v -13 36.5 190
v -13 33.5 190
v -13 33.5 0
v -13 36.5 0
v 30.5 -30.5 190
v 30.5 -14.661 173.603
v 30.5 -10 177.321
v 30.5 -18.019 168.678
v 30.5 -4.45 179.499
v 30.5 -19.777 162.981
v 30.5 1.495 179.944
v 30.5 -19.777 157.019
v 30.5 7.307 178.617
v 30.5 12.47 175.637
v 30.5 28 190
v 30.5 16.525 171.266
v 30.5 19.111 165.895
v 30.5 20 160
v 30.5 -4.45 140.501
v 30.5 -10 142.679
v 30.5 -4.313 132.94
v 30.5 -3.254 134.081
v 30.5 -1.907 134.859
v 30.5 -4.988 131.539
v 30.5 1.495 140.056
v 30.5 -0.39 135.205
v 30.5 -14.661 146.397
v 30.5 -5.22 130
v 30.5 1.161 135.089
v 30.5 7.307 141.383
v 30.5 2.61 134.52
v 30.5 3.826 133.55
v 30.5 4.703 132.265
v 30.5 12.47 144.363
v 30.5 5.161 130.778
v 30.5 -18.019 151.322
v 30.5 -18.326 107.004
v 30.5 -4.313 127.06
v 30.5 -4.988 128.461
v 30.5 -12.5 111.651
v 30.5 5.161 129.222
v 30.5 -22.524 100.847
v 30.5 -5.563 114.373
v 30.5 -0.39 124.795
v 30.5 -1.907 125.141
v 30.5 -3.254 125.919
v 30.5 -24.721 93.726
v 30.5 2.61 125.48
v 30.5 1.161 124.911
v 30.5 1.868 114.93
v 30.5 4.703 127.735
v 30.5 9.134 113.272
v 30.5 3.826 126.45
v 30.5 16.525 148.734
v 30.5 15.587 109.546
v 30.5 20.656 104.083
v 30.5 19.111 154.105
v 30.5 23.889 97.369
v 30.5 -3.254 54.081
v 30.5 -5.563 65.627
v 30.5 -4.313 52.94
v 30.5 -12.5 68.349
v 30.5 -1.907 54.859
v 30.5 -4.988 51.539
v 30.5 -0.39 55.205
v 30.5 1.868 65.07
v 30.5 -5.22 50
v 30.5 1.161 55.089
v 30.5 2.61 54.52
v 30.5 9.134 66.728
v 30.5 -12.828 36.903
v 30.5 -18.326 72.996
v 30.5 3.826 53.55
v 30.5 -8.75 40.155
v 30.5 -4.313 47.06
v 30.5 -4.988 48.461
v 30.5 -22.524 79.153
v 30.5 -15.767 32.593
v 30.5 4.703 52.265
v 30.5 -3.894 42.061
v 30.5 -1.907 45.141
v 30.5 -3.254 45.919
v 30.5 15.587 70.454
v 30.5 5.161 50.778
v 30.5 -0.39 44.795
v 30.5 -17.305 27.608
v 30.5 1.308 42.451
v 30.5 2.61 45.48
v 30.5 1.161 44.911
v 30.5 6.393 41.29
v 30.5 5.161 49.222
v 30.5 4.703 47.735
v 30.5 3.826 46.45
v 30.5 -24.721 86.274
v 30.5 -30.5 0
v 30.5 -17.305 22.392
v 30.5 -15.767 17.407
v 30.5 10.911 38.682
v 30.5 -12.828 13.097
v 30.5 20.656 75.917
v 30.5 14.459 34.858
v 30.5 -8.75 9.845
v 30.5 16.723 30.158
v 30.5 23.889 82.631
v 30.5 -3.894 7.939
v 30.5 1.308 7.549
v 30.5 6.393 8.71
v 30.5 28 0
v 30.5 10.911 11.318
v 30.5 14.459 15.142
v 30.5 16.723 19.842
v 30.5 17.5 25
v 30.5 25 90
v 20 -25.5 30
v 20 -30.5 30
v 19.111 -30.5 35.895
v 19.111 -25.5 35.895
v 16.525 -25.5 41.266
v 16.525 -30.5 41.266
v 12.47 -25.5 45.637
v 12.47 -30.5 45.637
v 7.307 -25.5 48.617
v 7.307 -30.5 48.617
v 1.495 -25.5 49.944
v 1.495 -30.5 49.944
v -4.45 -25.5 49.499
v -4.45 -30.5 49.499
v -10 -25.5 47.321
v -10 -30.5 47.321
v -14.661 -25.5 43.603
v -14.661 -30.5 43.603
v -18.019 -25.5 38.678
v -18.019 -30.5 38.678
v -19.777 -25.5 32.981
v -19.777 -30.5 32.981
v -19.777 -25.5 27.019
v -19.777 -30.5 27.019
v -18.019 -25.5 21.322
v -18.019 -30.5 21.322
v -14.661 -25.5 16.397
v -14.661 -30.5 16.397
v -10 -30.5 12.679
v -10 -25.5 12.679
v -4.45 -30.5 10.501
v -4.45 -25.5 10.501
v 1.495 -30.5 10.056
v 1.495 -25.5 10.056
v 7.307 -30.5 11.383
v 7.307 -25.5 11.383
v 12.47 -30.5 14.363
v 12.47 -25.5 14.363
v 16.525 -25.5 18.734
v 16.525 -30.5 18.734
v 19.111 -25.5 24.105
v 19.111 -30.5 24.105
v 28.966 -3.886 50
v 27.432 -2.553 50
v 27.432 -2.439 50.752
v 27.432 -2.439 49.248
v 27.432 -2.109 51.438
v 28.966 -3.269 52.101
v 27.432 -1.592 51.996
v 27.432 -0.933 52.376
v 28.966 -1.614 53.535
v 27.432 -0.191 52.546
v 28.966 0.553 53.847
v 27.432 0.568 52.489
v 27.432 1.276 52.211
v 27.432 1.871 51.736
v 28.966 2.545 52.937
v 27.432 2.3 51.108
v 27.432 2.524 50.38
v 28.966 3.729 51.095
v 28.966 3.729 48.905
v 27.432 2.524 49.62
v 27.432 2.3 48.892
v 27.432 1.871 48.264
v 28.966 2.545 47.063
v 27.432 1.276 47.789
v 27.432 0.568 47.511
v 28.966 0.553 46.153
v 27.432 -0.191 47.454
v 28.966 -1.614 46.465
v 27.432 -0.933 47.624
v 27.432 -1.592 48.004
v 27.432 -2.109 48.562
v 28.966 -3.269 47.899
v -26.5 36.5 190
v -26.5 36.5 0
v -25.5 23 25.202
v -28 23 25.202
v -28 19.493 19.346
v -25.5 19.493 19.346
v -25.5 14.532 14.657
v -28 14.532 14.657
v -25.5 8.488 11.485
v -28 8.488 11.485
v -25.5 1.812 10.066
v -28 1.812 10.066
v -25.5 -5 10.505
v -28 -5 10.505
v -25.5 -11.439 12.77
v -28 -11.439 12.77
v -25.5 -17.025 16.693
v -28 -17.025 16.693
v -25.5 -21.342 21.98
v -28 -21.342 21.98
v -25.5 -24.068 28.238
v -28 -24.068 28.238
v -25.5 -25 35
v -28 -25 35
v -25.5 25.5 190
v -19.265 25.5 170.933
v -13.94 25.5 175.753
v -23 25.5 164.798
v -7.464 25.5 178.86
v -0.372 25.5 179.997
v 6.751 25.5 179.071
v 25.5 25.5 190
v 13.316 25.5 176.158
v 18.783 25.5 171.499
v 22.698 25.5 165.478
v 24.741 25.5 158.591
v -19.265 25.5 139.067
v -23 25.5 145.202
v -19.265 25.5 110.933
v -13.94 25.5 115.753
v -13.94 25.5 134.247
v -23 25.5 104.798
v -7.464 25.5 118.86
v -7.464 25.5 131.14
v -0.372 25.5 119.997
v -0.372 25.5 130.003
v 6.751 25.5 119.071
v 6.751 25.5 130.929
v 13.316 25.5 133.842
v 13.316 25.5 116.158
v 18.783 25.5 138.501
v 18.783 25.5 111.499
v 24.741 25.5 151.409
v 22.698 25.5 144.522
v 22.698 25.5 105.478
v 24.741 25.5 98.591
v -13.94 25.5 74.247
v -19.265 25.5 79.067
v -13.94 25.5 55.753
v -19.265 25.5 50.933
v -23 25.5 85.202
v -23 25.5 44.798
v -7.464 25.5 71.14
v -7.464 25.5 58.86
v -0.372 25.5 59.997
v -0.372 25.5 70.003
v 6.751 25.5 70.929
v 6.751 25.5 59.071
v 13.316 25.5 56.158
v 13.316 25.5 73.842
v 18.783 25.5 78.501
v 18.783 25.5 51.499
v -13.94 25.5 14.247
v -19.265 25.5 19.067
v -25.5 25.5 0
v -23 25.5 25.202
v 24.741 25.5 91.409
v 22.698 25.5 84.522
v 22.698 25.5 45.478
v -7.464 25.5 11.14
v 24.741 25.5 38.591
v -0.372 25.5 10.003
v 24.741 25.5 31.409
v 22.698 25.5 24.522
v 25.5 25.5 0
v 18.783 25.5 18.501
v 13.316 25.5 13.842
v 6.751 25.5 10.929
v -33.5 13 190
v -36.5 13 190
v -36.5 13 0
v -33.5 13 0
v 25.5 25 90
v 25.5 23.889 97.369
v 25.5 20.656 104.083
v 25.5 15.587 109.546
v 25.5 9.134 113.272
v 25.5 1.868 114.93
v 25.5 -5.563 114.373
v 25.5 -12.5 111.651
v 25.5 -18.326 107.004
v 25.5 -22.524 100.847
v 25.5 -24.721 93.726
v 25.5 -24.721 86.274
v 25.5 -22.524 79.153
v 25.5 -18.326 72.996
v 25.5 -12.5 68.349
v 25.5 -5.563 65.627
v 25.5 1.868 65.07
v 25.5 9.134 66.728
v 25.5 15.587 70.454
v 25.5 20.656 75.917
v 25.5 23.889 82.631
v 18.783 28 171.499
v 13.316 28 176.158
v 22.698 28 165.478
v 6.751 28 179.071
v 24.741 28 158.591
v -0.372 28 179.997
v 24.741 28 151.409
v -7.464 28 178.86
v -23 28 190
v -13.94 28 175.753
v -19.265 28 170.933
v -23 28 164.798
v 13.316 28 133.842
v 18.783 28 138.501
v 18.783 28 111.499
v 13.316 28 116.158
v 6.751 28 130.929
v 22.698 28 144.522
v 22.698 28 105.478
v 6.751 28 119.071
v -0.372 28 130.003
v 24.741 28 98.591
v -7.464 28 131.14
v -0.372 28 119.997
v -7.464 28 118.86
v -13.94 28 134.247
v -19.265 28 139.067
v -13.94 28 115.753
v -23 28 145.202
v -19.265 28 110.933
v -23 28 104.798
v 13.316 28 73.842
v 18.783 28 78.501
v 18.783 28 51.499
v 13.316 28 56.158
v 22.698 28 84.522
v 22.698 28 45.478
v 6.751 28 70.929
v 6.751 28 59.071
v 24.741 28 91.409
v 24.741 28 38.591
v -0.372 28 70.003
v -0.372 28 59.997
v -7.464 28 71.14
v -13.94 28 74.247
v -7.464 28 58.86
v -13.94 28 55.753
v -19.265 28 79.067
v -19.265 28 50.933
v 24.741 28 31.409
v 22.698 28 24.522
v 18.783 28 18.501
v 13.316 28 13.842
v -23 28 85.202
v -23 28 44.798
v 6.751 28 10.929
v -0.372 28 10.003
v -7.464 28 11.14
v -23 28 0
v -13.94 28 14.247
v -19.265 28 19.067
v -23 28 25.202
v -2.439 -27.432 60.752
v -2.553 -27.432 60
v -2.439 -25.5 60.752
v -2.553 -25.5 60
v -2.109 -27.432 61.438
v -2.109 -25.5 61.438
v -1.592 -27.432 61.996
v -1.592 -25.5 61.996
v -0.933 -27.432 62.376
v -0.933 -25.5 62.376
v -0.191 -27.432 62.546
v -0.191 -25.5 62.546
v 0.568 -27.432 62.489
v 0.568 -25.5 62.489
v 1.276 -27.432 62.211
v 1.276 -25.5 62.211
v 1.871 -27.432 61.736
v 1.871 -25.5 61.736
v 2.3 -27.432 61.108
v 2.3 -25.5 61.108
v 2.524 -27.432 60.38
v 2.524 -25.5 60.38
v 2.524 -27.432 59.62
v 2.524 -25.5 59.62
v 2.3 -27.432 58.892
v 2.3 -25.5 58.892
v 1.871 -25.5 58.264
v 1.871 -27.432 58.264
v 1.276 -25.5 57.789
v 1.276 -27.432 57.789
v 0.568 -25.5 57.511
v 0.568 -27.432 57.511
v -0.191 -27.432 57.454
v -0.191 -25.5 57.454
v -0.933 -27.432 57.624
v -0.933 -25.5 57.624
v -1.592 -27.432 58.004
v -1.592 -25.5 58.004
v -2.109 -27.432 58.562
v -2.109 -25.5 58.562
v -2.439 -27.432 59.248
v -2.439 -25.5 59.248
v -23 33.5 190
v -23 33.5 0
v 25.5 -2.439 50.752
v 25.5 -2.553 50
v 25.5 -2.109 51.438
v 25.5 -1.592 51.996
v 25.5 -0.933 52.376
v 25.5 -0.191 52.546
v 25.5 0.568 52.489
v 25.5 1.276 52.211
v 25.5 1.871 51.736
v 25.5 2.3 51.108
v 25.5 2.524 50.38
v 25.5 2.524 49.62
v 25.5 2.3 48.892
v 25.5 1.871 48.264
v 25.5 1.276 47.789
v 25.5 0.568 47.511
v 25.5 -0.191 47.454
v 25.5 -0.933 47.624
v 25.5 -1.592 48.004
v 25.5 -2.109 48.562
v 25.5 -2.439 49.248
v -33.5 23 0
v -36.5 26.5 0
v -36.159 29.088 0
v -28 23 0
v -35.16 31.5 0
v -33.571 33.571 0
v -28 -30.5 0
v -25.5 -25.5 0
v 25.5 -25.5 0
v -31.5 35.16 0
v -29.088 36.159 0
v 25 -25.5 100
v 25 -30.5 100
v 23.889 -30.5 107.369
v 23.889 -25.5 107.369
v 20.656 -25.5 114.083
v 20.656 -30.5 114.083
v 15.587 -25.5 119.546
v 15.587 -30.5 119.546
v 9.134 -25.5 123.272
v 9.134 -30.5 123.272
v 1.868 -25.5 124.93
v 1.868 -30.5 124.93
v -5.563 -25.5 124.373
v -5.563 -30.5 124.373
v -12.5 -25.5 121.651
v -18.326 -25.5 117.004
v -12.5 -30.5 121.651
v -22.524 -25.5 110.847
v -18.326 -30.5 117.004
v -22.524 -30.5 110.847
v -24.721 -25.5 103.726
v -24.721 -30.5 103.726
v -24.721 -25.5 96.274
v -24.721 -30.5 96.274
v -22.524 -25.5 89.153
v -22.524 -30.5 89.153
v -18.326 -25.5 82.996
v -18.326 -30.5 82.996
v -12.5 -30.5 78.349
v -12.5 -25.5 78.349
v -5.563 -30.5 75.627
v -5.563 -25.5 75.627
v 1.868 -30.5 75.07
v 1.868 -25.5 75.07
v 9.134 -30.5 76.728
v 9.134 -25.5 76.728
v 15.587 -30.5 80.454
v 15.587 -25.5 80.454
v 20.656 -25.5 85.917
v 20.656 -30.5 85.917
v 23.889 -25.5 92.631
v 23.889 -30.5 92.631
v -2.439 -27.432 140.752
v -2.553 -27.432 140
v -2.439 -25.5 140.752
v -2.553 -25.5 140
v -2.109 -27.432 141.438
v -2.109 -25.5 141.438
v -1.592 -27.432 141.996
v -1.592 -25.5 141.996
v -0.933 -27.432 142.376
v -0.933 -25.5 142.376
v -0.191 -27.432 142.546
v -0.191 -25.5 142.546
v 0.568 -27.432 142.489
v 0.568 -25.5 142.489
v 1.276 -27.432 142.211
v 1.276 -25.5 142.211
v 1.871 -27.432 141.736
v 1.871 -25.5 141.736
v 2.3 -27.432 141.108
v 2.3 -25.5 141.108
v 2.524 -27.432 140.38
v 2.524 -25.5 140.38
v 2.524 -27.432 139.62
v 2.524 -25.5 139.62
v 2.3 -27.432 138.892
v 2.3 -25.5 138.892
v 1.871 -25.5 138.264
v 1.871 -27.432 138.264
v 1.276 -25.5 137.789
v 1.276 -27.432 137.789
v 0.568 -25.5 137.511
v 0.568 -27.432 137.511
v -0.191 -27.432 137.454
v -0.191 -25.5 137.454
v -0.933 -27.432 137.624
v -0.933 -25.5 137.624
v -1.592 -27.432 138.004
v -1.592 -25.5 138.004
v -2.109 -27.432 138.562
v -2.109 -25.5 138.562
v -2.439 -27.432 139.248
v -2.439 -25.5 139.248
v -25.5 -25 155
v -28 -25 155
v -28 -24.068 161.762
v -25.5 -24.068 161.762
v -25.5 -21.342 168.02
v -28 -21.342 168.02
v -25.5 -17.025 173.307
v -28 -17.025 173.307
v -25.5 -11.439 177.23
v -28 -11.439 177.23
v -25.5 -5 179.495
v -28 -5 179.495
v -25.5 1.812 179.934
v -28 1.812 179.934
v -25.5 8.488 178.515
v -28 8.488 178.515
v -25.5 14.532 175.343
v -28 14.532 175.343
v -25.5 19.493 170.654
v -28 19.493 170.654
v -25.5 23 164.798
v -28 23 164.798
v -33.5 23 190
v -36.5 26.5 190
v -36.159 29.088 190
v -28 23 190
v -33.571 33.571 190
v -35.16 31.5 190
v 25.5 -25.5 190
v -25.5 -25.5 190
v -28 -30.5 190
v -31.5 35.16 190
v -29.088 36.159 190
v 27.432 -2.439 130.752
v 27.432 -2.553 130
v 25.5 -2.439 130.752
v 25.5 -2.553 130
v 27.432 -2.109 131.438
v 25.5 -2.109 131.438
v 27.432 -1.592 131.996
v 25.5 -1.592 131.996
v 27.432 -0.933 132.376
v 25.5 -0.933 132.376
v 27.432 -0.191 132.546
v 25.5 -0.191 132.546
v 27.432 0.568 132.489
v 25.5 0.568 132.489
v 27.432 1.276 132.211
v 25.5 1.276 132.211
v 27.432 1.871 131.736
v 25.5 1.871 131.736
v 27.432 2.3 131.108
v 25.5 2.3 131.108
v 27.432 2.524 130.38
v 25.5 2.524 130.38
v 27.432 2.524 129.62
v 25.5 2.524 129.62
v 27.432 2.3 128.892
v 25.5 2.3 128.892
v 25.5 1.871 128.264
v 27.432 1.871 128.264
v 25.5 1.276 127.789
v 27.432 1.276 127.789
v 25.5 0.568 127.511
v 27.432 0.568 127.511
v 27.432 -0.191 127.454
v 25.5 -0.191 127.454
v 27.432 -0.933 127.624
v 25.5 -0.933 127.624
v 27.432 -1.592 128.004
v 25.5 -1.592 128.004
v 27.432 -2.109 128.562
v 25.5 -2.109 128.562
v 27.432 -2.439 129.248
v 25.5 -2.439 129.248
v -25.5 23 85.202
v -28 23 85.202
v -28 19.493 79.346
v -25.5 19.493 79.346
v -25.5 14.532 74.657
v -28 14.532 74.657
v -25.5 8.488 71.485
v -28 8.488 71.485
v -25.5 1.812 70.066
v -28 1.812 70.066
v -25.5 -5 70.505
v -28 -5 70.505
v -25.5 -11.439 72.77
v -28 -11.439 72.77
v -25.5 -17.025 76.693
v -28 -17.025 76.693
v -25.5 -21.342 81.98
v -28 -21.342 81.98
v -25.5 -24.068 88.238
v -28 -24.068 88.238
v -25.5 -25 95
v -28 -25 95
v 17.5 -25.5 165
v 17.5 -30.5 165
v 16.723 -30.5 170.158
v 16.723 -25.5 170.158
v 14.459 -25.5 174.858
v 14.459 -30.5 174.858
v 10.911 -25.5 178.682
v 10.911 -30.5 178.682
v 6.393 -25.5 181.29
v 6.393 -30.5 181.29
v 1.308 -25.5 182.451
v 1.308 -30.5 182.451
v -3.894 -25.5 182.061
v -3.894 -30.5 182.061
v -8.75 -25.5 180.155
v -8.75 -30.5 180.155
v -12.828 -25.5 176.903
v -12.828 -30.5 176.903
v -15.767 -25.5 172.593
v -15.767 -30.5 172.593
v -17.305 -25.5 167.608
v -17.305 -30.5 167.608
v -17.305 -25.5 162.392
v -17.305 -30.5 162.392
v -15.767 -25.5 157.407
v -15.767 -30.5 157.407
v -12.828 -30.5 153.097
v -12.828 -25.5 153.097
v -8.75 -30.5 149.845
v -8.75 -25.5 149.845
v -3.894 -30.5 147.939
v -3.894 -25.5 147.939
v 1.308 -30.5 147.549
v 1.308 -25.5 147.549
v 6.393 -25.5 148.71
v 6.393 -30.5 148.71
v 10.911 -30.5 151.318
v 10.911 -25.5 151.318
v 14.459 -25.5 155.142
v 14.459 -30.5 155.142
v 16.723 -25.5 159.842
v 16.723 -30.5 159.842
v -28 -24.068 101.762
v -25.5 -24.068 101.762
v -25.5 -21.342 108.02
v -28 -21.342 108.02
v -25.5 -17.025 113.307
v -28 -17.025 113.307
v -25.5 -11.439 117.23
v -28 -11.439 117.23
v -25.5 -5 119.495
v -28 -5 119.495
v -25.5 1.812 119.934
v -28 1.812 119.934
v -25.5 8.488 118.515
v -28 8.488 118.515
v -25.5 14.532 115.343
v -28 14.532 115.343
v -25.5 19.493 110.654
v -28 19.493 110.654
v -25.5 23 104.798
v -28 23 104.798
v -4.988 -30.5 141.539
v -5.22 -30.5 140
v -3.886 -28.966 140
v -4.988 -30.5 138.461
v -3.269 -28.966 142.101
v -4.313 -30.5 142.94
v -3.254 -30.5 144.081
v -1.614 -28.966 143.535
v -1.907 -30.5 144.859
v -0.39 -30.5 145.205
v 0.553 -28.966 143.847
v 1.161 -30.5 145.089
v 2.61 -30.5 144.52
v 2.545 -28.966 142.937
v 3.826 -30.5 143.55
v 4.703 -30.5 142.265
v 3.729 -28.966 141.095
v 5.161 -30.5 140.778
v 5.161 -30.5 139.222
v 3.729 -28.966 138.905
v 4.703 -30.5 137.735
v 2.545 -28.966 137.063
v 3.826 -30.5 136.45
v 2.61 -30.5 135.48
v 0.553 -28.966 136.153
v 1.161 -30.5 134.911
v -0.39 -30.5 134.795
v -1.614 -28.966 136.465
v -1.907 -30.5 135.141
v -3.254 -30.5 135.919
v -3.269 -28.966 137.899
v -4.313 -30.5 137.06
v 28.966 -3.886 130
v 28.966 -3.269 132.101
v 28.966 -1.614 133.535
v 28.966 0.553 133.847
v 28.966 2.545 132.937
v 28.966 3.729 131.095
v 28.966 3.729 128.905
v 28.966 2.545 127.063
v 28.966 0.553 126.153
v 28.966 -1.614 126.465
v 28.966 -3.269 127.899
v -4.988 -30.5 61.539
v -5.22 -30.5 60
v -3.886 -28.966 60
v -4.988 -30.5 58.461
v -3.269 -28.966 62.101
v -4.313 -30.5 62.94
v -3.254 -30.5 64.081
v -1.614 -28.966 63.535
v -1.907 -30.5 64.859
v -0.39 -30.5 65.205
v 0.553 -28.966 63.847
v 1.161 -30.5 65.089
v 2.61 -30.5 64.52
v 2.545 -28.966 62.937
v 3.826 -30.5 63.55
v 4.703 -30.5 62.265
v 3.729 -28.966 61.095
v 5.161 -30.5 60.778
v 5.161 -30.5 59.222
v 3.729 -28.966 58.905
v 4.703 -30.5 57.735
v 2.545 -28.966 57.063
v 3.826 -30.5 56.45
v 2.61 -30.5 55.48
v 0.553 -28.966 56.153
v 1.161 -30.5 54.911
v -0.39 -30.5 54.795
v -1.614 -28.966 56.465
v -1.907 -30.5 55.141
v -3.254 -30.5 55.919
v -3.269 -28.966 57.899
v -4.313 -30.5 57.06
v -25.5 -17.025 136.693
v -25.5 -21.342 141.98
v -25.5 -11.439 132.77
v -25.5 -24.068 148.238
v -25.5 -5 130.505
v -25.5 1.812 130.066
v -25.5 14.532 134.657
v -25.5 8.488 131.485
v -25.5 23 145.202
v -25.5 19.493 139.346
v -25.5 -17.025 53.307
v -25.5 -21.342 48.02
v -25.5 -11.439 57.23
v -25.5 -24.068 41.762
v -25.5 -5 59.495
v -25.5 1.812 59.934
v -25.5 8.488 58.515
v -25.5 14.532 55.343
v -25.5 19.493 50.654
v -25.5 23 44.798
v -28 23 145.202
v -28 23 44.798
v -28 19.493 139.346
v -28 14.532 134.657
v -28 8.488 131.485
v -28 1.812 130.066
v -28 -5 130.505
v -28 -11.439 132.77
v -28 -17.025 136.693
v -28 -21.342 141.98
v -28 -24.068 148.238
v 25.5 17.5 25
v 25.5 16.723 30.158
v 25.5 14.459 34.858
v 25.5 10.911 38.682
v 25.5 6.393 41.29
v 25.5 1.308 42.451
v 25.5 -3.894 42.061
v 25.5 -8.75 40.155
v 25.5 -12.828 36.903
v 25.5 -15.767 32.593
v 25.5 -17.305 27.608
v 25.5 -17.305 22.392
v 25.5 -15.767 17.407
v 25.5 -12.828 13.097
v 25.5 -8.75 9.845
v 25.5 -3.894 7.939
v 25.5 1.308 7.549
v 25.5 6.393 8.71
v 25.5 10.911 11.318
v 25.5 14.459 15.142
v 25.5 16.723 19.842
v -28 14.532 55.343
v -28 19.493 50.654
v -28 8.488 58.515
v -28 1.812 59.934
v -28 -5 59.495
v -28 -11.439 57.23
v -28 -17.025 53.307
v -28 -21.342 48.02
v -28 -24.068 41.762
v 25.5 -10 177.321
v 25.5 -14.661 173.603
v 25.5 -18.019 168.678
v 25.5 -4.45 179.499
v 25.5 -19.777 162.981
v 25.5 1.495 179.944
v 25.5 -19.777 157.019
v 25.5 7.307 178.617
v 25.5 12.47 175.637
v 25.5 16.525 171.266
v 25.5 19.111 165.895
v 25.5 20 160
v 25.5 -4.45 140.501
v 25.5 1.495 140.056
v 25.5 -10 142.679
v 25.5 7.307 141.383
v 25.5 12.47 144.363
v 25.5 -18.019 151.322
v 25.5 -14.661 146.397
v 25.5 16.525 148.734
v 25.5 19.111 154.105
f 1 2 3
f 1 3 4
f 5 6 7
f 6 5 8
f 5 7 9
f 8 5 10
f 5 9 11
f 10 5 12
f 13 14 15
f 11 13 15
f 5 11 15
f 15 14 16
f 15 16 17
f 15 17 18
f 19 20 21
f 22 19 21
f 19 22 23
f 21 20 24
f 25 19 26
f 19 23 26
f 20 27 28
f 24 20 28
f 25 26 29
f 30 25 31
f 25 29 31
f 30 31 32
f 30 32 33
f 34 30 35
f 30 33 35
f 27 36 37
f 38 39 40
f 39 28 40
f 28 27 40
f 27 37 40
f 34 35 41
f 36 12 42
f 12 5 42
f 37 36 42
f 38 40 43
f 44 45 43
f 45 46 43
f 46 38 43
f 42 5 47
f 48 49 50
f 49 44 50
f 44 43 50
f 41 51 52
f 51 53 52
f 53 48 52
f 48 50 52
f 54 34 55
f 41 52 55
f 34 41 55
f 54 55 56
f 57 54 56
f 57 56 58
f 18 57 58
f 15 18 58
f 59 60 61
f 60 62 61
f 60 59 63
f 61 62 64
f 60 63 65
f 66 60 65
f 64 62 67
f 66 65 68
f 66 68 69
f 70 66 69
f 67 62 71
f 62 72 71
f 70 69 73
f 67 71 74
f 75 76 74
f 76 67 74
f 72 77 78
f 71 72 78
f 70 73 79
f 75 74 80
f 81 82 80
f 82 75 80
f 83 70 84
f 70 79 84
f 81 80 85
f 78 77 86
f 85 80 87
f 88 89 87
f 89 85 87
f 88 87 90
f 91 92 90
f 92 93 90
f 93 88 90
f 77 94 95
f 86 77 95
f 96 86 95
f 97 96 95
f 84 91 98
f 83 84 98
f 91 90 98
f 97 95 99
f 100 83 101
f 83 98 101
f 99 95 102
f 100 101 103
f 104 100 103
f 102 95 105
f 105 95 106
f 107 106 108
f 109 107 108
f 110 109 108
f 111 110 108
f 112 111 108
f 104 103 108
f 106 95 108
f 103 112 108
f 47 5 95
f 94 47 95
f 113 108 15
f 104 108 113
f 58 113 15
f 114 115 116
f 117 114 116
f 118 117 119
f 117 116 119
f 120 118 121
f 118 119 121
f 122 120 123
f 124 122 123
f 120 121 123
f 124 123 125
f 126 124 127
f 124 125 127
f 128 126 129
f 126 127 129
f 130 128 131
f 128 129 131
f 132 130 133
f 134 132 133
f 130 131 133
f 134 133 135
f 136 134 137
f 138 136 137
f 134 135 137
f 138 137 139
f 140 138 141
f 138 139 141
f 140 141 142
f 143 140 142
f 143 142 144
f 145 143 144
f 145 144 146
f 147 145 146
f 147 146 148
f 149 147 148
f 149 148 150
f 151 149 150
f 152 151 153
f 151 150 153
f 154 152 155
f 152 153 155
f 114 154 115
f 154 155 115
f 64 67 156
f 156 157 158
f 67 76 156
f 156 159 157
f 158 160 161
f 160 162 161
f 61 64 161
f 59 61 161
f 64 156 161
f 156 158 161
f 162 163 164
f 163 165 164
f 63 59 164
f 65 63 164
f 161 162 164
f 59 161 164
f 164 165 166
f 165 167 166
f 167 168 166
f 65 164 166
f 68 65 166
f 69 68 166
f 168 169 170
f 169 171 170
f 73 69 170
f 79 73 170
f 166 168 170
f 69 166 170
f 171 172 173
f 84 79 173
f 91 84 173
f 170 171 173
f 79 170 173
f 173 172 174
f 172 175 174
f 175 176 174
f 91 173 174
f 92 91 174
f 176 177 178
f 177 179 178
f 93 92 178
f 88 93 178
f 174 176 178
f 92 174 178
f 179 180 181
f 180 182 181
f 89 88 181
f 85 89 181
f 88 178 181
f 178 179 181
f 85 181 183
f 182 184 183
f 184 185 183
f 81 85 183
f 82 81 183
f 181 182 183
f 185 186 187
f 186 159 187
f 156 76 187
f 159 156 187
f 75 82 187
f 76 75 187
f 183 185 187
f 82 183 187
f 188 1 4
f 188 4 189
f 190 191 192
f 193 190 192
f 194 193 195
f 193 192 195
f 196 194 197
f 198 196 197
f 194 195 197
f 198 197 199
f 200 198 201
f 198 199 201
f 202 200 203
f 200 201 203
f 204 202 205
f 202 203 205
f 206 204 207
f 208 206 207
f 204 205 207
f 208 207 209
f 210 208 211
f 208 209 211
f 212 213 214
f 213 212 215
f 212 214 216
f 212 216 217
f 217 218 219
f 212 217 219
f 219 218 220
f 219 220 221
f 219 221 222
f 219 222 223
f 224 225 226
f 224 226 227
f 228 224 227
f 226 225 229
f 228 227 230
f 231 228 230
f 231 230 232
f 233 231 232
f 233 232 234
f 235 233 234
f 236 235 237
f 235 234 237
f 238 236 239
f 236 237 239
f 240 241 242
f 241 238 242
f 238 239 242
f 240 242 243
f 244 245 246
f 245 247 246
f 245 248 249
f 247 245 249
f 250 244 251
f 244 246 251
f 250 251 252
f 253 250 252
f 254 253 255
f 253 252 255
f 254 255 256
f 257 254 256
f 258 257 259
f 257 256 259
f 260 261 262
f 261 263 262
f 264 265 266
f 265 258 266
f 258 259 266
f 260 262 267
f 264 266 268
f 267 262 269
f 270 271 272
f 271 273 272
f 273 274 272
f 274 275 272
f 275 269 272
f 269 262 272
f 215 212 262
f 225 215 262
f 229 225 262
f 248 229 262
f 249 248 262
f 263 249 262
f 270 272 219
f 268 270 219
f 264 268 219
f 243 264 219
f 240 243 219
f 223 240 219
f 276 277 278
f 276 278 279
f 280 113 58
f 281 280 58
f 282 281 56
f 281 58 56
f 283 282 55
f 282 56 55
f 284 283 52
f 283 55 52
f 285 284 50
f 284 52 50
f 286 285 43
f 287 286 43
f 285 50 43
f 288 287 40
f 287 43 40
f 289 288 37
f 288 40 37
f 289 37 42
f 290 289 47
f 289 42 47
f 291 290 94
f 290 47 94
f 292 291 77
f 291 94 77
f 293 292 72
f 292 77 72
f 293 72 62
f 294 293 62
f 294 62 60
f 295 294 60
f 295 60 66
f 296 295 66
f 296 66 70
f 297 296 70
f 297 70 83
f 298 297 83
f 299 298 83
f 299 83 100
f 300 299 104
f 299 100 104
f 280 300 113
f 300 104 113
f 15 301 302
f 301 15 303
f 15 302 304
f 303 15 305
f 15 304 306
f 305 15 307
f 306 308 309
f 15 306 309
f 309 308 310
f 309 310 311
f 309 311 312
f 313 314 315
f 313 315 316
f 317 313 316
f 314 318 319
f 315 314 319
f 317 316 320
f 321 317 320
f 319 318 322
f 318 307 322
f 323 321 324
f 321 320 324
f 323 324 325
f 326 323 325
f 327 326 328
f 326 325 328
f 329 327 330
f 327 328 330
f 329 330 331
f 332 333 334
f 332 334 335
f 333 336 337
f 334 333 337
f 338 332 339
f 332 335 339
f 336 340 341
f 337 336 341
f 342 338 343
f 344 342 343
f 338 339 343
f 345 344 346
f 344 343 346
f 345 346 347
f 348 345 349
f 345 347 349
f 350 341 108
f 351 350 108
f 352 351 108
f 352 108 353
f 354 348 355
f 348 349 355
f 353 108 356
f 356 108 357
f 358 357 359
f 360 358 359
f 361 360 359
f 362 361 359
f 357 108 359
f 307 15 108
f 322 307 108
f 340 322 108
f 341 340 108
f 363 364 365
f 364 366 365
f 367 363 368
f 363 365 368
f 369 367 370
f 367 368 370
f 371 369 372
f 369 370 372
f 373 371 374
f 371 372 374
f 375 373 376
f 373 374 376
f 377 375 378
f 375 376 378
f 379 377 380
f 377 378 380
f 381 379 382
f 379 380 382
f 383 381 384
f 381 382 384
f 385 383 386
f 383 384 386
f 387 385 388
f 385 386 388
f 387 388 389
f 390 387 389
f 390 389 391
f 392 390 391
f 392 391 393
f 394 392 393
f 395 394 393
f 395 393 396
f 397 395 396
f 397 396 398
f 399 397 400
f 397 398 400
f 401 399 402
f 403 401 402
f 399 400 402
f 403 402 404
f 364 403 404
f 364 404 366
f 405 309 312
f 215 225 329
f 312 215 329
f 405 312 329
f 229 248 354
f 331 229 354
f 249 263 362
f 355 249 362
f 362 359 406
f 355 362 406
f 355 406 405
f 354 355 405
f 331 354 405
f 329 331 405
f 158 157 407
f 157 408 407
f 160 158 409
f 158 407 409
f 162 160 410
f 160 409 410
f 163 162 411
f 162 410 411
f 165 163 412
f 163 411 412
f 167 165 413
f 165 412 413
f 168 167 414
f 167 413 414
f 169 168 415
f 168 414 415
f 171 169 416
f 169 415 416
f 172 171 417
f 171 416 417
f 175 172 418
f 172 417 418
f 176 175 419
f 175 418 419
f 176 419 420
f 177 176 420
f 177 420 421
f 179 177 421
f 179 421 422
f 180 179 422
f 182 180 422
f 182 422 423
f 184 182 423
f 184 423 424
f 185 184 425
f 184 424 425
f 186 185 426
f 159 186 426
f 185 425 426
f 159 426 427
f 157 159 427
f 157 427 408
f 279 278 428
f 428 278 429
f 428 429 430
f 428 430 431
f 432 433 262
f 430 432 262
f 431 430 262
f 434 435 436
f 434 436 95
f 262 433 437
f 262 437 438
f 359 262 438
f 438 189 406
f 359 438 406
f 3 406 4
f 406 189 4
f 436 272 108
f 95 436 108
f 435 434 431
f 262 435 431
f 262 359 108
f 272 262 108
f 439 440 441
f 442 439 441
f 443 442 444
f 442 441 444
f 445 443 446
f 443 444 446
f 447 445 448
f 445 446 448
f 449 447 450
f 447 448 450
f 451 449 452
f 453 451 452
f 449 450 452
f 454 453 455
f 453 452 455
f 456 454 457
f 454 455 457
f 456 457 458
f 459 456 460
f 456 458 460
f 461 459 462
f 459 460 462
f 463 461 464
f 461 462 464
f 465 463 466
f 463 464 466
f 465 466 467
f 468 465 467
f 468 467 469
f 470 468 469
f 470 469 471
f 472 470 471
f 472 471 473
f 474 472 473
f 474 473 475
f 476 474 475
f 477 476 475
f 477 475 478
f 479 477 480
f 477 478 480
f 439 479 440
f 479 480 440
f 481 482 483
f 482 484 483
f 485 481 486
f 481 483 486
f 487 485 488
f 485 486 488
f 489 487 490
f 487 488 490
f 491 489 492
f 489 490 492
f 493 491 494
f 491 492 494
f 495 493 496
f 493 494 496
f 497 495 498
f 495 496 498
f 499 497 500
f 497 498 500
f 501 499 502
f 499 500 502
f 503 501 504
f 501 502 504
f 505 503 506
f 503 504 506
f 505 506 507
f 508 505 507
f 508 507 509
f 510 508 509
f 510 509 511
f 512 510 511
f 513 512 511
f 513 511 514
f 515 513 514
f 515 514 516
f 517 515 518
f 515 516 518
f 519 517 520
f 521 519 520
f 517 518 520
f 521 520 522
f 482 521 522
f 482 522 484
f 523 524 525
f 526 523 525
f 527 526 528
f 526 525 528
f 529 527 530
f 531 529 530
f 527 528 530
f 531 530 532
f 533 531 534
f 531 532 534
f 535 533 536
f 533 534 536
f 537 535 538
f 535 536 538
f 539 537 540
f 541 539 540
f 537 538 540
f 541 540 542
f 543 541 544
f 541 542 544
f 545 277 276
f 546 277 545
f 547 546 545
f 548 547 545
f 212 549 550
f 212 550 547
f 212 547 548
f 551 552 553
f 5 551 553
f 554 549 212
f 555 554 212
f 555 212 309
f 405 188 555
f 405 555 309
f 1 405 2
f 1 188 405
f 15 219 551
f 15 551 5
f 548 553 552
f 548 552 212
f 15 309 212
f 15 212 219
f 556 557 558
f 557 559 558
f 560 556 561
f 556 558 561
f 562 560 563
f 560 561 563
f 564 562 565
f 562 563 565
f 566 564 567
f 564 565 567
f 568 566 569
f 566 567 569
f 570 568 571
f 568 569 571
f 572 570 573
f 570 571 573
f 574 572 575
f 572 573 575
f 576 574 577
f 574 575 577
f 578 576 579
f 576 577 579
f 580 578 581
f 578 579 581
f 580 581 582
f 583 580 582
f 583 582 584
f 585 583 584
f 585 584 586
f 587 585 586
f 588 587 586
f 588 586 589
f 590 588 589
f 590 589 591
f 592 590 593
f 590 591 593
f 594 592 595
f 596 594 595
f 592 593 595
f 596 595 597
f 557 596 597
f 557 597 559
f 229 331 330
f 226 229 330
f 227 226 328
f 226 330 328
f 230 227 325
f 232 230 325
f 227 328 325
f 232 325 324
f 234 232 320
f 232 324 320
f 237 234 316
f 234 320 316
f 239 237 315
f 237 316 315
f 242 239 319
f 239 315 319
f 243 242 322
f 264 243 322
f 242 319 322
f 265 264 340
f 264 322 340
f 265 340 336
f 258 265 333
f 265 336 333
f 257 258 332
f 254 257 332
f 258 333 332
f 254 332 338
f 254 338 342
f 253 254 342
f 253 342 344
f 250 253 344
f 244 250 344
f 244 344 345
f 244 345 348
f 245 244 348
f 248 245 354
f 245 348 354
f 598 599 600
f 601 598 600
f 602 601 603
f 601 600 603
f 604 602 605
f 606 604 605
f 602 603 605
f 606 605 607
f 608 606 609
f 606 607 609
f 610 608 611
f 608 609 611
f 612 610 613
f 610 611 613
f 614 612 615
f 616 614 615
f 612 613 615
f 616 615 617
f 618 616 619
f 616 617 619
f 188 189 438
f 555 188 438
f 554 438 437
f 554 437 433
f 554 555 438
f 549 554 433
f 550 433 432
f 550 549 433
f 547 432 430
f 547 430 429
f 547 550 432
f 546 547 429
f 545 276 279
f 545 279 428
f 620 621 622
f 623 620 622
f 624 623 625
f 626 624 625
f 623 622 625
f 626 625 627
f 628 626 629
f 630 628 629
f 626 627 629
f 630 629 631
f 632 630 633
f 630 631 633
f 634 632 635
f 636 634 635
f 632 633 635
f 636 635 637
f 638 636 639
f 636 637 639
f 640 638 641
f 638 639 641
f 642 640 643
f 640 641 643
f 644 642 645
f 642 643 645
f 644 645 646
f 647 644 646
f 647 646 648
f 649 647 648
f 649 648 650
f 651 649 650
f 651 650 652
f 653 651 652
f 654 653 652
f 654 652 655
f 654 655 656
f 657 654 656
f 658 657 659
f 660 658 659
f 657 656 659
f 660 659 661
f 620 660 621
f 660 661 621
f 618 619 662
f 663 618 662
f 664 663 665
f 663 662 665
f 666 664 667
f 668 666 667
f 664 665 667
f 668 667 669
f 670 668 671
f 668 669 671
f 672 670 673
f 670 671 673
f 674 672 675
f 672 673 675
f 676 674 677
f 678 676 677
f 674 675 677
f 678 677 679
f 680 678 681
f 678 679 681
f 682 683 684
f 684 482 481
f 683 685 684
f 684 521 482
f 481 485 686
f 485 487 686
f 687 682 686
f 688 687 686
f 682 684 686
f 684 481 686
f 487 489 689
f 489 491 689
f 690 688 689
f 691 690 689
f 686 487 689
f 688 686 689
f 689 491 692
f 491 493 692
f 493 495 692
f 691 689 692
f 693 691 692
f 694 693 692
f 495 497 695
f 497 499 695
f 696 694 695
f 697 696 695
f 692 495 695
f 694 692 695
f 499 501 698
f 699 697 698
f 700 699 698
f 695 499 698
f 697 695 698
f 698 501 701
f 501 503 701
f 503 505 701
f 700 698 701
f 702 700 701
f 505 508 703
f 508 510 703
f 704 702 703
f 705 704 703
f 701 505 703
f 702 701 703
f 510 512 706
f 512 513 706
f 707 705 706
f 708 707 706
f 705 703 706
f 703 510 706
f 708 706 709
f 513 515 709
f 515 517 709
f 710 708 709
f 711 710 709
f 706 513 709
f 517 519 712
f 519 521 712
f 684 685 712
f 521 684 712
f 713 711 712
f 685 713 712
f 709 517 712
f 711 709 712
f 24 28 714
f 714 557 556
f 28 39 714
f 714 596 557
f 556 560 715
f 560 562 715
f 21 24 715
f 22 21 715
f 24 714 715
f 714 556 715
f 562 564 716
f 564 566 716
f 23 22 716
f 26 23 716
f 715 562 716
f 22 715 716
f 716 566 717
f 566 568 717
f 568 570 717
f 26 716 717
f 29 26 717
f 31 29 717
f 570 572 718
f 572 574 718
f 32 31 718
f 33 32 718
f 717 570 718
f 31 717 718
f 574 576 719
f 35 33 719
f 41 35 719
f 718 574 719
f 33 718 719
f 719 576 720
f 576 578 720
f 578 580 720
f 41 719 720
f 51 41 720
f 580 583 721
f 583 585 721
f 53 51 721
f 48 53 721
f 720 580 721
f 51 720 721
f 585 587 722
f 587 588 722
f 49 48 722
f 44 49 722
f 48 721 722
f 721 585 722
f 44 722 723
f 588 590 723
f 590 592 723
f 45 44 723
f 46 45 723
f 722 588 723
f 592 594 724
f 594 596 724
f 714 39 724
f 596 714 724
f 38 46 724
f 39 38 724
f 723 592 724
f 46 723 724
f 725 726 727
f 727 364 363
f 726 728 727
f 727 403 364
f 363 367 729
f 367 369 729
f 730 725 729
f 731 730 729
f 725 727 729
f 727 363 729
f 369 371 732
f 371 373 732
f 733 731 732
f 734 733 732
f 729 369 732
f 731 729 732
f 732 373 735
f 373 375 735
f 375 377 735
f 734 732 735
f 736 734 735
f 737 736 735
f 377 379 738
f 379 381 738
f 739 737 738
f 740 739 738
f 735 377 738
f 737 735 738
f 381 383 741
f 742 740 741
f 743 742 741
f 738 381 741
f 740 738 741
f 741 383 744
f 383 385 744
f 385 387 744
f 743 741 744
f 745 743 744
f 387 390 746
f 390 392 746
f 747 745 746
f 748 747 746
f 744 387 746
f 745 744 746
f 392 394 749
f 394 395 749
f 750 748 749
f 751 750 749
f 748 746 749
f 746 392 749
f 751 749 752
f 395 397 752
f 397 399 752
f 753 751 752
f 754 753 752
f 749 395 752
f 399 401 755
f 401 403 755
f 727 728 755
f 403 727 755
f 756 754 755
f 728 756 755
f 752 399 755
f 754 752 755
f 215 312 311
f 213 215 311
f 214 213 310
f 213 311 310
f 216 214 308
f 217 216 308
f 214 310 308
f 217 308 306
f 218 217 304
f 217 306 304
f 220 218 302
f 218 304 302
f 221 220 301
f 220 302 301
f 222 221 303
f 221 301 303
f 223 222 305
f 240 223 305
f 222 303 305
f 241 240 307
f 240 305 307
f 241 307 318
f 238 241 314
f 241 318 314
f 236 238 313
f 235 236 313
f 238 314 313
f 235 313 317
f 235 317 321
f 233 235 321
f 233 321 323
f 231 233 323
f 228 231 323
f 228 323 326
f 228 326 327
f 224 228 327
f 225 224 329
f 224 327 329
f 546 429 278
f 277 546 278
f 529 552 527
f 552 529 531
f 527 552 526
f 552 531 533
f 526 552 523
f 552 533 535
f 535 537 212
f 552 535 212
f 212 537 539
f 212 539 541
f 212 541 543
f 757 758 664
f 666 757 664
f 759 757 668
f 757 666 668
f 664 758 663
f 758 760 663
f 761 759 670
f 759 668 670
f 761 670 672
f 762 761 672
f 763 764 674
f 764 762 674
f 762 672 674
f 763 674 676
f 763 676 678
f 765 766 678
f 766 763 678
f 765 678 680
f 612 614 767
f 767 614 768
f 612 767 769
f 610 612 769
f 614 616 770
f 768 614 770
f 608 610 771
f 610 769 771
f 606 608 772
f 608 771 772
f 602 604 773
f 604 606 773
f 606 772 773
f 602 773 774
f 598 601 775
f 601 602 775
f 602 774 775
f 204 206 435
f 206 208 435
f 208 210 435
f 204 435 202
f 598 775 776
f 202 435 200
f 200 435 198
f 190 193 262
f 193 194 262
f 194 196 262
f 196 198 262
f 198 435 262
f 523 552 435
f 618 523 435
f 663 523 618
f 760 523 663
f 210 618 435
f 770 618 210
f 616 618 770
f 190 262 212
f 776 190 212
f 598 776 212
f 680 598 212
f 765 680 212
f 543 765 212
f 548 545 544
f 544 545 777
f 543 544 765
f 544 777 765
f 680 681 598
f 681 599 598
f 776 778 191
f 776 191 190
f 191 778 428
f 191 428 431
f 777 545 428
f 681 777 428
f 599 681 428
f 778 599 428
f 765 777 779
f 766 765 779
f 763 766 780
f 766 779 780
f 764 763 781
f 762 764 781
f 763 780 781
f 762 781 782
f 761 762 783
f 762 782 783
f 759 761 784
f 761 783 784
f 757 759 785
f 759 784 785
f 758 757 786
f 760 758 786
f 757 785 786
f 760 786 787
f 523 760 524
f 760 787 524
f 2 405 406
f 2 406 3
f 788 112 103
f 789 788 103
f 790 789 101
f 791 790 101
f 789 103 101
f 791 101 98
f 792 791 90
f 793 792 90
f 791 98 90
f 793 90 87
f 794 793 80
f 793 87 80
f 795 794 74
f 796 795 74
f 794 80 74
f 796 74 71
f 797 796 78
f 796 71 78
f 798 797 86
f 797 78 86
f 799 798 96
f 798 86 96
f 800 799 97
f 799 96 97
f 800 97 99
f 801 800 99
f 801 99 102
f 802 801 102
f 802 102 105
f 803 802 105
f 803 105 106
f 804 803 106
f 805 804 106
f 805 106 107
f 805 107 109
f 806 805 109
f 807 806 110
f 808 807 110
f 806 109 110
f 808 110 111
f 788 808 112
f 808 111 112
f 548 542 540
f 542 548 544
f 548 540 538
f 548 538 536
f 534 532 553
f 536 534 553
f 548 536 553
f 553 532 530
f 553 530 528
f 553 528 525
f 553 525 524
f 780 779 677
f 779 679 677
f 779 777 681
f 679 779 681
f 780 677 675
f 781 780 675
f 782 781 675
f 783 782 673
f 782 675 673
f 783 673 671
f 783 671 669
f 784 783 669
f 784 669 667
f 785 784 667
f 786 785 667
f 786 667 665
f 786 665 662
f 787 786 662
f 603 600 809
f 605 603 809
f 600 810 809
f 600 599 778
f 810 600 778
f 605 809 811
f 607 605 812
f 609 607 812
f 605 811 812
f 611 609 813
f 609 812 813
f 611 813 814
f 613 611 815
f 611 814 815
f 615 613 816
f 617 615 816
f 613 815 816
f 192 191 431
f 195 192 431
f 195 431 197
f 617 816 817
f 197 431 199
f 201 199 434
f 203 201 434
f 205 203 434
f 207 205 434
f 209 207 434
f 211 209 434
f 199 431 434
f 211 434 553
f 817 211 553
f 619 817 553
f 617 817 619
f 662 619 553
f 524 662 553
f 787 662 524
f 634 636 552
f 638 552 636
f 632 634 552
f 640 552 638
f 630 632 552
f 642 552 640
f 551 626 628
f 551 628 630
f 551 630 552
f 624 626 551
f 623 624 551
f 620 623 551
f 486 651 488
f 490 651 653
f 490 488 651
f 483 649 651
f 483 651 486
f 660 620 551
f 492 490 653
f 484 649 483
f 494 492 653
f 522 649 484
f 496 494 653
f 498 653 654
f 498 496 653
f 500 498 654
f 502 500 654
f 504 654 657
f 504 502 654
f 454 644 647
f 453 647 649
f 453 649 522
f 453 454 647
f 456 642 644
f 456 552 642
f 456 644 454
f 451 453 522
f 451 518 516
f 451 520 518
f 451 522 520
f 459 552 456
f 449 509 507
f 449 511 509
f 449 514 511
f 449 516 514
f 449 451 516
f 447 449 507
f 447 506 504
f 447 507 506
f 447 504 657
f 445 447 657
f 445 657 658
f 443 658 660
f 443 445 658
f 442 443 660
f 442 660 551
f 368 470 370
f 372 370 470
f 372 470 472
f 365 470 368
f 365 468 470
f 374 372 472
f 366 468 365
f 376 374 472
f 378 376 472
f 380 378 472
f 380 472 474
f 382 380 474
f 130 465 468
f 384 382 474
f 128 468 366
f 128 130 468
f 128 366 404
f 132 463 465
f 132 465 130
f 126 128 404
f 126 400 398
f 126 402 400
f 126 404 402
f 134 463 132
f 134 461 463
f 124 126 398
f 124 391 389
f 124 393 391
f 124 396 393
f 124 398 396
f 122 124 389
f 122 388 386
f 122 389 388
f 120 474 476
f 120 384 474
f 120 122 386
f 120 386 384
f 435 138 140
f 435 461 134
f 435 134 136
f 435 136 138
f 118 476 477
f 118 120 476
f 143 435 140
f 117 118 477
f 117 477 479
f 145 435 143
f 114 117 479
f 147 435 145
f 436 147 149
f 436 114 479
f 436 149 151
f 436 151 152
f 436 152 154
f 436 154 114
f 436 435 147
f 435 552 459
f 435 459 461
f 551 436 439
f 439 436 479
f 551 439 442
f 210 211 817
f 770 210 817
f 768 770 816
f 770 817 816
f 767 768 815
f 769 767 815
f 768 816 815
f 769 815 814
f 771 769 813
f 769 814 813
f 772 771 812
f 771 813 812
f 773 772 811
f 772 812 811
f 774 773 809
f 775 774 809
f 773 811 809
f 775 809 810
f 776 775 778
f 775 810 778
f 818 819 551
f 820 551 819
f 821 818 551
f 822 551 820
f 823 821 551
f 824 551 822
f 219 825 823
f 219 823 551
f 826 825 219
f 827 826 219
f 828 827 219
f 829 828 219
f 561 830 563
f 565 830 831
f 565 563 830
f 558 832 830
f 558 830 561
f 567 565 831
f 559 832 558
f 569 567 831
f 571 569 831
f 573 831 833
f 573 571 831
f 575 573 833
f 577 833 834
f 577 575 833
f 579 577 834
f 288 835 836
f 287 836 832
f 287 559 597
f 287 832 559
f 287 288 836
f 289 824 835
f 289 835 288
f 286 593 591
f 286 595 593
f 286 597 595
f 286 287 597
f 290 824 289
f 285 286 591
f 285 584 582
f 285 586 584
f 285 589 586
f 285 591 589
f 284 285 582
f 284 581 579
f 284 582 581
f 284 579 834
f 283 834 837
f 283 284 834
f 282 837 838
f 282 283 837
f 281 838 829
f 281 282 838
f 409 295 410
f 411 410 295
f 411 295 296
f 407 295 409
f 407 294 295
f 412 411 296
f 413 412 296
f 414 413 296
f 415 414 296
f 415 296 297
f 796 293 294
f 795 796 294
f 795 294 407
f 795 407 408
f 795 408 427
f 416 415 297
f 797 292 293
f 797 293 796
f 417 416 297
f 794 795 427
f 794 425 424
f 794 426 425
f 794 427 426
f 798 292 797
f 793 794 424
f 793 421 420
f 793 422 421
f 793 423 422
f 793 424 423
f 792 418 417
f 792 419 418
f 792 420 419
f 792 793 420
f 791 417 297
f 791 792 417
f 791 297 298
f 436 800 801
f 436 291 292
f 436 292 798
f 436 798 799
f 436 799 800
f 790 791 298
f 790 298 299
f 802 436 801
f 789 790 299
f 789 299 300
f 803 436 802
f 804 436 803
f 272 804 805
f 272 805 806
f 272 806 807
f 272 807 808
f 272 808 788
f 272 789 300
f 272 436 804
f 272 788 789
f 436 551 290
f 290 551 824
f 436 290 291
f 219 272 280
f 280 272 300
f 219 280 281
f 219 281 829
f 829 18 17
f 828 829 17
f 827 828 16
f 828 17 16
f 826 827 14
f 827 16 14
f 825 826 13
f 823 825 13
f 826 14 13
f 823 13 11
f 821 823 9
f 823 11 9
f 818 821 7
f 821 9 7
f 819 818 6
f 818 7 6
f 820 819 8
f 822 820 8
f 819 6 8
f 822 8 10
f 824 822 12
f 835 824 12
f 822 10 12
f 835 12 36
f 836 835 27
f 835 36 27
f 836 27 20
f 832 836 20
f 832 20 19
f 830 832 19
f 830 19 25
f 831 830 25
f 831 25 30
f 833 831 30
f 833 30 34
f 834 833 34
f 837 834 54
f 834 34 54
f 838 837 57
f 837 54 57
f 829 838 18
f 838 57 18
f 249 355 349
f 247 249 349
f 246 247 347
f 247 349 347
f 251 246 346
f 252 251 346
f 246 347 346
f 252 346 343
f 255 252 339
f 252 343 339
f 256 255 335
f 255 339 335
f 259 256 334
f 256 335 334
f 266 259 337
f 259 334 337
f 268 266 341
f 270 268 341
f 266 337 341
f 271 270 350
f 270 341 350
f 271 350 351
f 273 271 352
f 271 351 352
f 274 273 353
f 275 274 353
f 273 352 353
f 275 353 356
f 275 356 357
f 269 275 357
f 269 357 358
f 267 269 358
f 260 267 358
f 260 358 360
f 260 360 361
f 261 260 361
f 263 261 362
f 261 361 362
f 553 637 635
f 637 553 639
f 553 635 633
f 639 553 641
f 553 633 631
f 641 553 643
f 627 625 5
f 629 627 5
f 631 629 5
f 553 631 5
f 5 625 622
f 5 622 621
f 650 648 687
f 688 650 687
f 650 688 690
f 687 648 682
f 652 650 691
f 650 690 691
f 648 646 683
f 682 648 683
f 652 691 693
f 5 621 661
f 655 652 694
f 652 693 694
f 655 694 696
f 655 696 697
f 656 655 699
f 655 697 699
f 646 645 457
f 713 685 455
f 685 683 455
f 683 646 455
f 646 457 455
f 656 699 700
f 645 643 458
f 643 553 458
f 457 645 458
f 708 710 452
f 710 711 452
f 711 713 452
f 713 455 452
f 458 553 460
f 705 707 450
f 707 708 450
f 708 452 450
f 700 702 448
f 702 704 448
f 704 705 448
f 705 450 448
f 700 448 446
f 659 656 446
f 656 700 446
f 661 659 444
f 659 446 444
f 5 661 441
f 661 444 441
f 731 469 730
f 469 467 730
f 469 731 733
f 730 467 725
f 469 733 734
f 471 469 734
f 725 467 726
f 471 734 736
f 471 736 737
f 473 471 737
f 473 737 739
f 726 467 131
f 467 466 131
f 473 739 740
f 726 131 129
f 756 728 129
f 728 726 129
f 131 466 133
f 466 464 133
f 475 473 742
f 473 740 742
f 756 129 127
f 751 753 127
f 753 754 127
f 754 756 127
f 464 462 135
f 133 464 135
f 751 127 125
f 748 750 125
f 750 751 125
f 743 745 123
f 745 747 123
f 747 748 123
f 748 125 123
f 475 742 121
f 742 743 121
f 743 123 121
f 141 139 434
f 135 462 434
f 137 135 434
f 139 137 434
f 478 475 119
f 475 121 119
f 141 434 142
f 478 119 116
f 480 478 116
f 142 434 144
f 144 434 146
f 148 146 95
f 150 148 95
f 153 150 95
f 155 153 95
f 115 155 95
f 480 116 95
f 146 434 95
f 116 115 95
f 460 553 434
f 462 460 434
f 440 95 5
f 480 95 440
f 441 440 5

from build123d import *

# Parameters (mm, degrees)
F0_W           = 5
F0_H           = 5.5
F0_W_2         = 5.5
F0_H_2         = 5
F0_W_3         = 51
F0_H_3         = 51
F1_DEPTH       = 190
F2_R           = 10
F3_R           = 25
F3_R_2         = 17.5
F3_R_3         = 20
F4_DEPTH       = 5
F5_D           = 5.1054
F5_DEPTH       = 12
F5_CSINK_D     = 10.4394
F5_CSINK_ANGLE = 82
F5_TIP         = 1.5338169022
F7_D           = 5.1054
F7_DEPTH       = 12
F7_CSINK_D     = 10.4394
F7_CSINK_ANGLE = 82
F7_TIP         = 1.5338169022
F6_R           = 20
F6_R_2         = 25
F6_R_3         = 17.5
F8_DEPTH       = 5
F10_DEPTH      = 2.5
F12_DEPTH      = 2.5


with BuildPart() as f1:
    # F0 (on Top) → F1 (new body)
    with BuildSketch(Plane.XY):
        Polygon((-33.5, 28), (-28, 28), (-28, 33.5), (-28, 36.5), (-36.5, 36.5), (-36.5, 28), align=None)
        Polygon((-28, 36.5), (-28, 33.5), (-23, 33.5), (-13, 33.5), (-13, 36.5), align=None)
        with Locations((-25.5, 30.75)):
            Rectangle(F0_W, F0_H)
        with Locations((-30.75, 25.5)):
            Rectangle(F0_W_2, F0_H_2)
        Polygon((-33.5, 23), (-33.5, 28), (-36.5, 28), (-36.5, 13), (-33.5, 13), align=None)
        Polygon((-23, 28), (-28, 28), (-28, 23), (-28, -30.5), (30.5, -30.5), (30.5, 28), align=None)
        Rectangle(F0_W_3, F0_H_3, mode=Mode.SUBTRACT)
    extrude(amount=F1_DEPTH)

    # F2
    f2_edges = [f1.edges().sort_by_distance(p)[0] for p in [
        (-36.5, 36.5, 95),
    ]]
    fillet(f2_edges, radius=F2_R)

    # F3 (on face) → F4 (cut, through all)
    with BuildSketch(Plane.XZ.offset(30.5)):
        with Locations((0, 100)):
            Circle(F3_R)
        with Locations((0, 165)):
            Circle(F3_R_2)
        with Locations((0, 30)):
            Circle(F3_R_3)
    extrude(amount=-F4_DEPTH, mode=Mode.SUBTRACT)

    # F5
    with Locations(Plane.XZ.offset(30.5)):
        with Locations((0, 140), (0, 60)):
            CounterSinkHole(F5_D / 2, F5_CSINK_D / 2, depth=F5_DEPTH, counter_sink_angle=F5_CSINK_ANGLE)
            with Locations((0, 0, -(F5_DEPTH + F5_TIP / 2))):  # 118° drill point
                Cone(0, F5_D / 2, F5_TIP, mode=Mode.SUBTRACT)

    # F7
    with Locations(Plane.YZ.offset(30.5)):
        with Locations((0, 130), (0, 50)):
            CounterSinkHole(F7_D / 2, F7_CSINK_D / 2, depth=F7_DEPTH, counter_sink_angle=F7_CSINK_ANGLE)
            with Locations((0, 0, -(F7_DEPTH + F7_TIP / 2))):  # 118° drill point
                Cone(0, F7_D / 2, F7_TIP, mode=Mode.SUBTRACT)

    # F6 (on face) → F8 (cut, through all)
    with BuildSketch(Plane.YZ.offset(30.5)):
        with Locations((0, 160)):
            Circle(F6_R)
        with Locations((0, 90)):
            Circle(F6_R_2)
        with Locations((0, 25)):
            Circle(F6_R_3)
    extrude(amount=-F8_DEPTH, mode=Mode.SUBTRACT)

    # F9 (on face) → F10 (cut, through all)
    with BuildSketch(Plane(origin=(-28, 0, 0), x_dir=(0, -1, 0), z_dir=(-1, 0, 0))):
        with BuildLine():
            Line((-23, 164.7979589711), (-23, 145.2020410289))
            ThreePointArc((-23, 145.2020410289), (5, 130.5051025722), (25, 155))
            ThreePointArc((25, 155), (5, 179.4948974278), (-23, 164.7979589711))
        make_face()
        with BuildLine():
            ThreePointArc((-23, 85.2020410289), (5, 70.5051025722), (25, 95))
            ThreePointArc((25, 95), (5, 119.4948974278), (-23, 104.7979589711))
            Line((-23, 104.7979589711), (-23, 85.2020410289))
        make_face()
        with BuildLine():
            ThreePointArc((25, 35), (5, 59.4948974278), (-23, 44.7979589711))
            Line((-23, 44.7979589711), (-23, 25.2020410289))
            ThreePointArc((-23, 25.2020410289), (5, 10.5051025722), (25, 35))
        make_face()
    extrude(amount=-F10_DEPTH, mode=Mode.SUBTRACT)

    # F11 (on face) → F12 (cut, through all)
    with BuildSketch(Plane(origin=(0, 28, 0), x_dir=(-1, 0, 0), z_dir=(0, 1, 0))):
        with BuildLine():
            ThreePointArc((23, 164.7979589711), (-25, 155), (23, 145.2020410289))
            Line((23, 145.2020410289), (23, 164.7979589711))
        make_face()
        with BuildLine():
            Line((23, 85.2020410289), (23, 104.7979589711))
            ThreePointArc((23, 104.7979589711), (-25, 95), (23, 85.2020410289))
        make_face()
        with BuildLine():
            Line((23, 25.2020410289), (23, 44.7979589711))
            ThreePointArc((23, 44.7979589711), (-25, 35), (23, 25.2020410289))
        make_face()
    extrude(amount=-F12_DEPTH, mode=Mode.SUBTRACT)


solid = f1.part
